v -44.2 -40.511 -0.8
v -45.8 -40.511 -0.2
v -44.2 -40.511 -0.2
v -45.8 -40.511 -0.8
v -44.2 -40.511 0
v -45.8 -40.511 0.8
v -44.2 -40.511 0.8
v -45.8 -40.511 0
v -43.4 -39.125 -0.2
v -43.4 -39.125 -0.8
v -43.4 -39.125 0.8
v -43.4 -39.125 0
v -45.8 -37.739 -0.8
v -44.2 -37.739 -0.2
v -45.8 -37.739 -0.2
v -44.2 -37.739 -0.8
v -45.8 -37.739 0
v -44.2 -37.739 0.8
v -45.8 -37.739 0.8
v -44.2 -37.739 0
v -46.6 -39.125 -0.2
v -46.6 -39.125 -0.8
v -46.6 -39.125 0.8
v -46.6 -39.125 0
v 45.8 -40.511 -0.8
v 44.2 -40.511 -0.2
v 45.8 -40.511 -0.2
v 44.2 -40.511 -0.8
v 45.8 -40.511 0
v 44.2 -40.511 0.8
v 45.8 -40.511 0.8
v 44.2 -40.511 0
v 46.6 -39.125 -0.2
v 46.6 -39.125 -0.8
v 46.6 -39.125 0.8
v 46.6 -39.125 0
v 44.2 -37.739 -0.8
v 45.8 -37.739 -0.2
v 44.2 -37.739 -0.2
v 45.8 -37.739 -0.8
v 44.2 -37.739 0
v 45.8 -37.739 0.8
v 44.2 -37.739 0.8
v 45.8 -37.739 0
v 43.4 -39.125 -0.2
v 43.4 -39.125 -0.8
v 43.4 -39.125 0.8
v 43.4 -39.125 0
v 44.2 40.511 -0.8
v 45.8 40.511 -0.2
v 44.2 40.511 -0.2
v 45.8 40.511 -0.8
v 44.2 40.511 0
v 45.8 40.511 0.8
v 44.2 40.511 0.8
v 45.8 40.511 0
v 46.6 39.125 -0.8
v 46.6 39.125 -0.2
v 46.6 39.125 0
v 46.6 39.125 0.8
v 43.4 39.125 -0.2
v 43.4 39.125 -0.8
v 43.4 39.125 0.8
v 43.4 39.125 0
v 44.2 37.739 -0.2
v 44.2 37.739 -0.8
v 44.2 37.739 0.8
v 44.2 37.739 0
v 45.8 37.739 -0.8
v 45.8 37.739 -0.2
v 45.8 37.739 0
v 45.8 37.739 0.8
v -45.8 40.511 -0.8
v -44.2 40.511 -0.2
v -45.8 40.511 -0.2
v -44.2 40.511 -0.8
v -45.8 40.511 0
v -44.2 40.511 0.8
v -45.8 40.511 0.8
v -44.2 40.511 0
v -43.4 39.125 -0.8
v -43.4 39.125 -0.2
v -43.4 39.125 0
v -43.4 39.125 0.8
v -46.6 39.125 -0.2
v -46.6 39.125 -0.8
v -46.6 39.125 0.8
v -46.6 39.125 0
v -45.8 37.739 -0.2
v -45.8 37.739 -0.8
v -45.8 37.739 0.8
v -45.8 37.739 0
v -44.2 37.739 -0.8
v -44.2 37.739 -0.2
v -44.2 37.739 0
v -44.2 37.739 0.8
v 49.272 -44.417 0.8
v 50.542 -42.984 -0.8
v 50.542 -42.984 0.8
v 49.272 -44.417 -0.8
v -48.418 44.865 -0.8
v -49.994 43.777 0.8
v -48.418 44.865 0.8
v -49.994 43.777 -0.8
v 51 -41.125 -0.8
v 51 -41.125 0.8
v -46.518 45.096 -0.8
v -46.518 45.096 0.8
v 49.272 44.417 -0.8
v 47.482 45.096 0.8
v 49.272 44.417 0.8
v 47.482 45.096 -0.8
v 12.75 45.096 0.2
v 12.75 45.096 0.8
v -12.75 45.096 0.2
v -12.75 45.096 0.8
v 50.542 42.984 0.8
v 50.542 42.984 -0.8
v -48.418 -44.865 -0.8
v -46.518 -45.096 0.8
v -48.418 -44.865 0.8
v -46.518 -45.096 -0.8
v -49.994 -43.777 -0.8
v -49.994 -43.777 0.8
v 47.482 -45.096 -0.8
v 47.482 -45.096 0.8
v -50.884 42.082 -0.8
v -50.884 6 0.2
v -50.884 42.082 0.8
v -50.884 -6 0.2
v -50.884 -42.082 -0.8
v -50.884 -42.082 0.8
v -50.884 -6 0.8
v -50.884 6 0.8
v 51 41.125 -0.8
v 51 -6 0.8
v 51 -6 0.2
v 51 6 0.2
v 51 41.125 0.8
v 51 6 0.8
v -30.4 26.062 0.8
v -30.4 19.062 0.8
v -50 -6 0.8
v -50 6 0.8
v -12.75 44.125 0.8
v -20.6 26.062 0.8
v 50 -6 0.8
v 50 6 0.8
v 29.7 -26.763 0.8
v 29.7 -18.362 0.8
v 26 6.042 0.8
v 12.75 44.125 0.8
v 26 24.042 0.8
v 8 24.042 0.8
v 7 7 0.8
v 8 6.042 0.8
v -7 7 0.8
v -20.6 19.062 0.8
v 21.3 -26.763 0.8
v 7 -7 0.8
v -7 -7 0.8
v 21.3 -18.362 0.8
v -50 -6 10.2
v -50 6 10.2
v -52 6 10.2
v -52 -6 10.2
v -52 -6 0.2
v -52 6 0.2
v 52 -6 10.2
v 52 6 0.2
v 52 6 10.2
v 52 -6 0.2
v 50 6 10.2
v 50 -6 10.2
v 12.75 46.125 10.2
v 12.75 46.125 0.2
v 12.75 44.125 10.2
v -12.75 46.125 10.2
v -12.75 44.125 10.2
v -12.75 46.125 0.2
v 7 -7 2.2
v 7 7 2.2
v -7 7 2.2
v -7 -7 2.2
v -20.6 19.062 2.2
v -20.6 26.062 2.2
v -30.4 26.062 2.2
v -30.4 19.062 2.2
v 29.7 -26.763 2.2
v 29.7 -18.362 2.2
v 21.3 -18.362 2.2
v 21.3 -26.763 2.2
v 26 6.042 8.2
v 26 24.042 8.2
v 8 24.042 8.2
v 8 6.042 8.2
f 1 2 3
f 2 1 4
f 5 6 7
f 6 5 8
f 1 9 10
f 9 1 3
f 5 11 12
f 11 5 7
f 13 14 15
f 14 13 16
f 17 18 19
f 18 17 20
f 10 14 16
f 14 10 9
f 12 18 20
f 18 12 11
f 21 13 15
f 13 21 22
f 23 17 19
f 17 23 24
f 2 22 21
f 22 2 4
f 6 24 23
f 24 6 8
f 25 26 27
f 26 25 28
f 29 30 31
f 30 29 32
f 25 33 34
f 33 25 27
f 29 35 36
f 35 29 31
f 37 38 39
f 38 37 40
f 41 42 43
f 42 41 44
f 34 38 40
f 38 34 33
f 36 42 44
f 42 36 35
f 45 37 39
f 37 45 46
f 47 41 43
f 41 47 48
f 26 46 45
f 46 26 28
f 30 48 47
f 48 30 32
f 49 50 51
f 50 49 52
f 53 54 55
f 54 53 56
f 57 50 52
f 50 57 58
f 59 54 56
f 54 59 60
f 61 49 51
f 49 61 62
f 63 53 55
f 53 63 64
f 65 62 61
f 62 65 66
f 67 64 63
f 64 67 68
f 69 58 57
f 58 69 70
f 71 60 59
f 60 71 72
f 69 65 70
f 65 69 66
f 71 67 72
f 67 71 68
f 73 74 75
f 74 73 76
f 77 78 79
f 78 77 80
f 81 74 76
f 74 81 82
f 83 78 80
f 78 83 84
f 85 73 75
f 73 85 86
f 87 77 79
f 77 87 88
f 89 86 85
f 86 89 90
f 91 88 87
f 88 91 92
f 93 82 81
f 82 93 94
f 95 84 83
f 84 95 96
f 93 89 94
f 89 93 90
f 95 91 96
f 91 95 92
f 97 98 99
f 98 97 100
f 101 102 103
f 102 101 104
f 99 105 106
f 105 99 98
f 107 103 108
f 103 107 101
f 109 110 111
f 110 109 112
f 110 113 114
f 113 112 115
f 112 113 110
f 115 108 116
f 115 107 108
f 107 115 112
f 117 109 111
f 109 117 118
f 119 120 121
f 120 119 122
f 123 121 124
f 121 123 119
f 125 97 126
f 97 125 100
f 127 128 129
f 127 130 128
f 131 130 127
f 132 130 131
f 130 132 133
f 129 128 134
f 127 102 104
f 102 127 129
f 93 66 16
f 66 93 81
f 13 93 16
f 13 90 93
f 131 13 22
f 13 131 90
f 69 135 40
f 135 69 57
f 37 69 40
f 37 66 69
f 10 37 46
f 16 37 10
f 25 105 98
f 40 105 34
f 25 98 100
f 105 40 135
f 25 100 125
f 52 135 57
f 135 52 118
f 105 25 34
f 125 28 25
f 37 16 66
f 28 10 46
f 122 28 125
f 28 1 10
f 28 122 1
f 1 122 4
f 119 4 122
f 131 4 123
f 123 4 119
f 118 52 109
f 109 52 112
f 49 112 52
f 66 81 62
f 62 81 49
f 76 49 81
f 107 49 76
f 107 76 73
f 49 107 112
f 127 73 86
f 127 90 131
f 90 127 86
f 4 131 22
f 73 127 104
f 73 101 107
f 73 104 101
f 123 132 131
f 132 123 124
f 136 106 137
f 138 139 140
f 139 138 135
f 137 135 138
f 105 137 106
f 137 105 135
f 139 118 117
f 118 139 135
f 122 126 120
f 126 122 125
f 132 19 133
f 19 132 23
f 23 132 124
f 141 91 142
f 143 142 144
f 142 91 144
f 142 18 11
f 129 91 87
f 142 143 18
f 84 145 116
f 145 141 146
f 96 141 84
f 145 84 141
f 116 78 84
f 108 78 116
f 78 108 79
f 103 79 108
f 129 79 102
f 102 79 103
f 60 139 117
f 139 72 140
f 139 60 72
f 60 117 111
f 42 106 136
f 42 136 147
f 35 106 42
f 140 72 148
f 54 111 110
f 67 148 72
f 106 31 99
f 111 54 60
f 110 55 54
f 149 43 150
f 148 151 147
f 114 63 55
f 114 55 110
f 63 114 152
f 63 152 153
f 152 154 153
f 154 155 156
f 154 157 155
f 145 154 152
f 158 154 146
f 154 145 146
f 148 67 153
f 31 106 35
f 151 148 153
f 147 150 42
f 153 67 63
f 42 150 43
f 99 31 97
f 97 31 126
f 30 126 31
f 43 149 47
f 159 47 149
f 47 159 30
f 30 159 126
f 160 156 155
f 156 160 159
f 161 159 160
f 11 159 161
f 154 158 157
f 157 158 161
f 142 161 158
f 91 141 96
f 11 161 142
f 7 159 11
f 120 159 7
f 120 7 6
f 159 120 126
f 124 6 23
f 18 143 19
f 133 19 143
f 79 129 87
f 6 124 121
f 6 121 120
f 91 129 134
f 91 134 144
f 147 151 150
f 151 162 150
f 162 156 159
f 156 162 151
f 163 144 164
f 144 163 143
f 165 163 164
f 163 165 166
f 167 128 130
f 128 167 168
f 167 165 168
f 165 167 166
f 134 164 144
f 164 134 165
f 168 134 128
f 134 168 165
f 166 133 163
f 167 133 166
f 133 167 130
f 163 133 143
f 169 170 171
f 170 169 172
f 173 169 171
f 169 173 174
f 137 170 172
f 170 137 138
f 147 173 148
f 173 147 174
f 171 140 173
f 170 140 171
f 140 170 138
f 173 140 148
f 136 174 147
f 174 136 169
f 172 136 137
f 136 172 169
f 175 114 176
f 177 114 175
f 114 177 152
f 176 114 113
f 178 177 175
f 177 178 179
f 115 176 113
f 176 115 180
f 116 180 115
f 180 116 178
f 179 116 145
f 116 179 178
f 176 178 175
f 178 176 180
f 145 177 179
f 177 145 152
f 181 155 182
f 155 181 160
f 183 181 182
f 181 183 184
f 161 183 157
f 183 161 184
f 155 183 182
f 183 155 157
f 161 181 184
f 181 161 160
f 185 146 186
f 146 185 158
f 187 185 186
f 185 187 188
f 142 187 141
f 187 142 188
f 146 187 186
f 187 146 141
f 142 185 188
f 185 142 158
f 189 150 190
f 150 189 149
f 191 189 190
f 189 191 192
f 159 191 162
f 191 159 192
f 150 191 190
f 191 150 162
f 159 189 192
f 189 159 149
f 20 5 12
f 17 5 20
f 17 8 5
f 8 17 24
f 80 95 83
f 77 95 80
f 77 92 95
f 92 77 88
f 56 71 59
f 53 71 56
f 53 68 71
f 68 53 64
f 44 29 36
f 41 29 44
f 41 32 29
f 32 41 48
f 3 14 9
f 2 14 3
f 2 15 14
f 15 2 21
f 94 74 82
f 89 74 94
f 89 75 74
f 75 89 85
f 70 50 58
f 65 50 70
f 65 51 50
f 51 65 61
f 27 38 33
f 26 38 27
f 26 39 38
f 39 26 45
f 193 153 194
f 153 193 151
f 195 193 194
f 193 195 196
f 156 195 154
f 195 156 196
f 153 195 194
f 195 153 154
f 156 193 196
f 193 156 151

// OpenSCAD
// Parameters
pcb_length = 102.0; //[51.0:204.0:0.5]
pcb_width = 90.25; //[45.0:180.5:0.25]
pcb_thickness = 1.6; //[0.8:3.2:0.1]
corner_radius = 4.0; //[2.0:8.0:0.5]
mount_hole_diameter = 3.2; //[2.0:5.0:0.1]
mount_hole_edge_offset_x = 6.0; //[3.0:12.0:0.5]
mount_hole_edge_offset_y = 6.0; //[3.0:12.0:0.5]
hole_cut_extra_z = 2.0; //[1.0:5.0:0.5]
overlap = 1.0; //[0.5:2.0:0.1]
silkscreen_thickness = 0.2; //[0.1:0.6:0.05]
silkscreen_margin = 3.0; //[1.0:8.0:0.5]
connector_height = 10.0; //[5.0:20.0:0.5]
connector_depth = 12.0; //[6.0:25.0:0.5]
connector_wall = 2.0; //[1.0:4.0:0.5]
chip_height = 2.0; //[1.0:6.0:0.25]
chip_size_x = 14.0; //[7.0:28.0:0.5]
chip_size_y = 14.0; //[7.0:28.0:0.5]
heatsink_height = 8.0; //[4.0:20.0:0.5]
heatsink_size_x = 18.0; //[10.0:36.0:0.5]
heatsink_size_y = 18.0; //[10.0:36.0:0.5]
component_overlap_into_pcb = 0.6; //[0.3:1.2:0.1]

// Base Shapes
module corner_cylinder(x, y) {
  translate([x, y, 0])
    cylinder(r=corner_radius, h=pcb_thickness, center=true);
}

module mount_hole(x, y) {
  translate([x, y, 0])
    cylinder(r=mount_hole_diameter/2, h=pcb_thickness + hole_cut_extra_z, center=true);
}

module silkscreen_border() {
  translate([0, 0, pcb_thickness/2 + silkscreen_thickness/2 - overlap])
    cube([pcb_length - 2*silkscreen_margin, pcb_width - 2*silkscreen_margin, silkscreen_thickness], center=true);
}

module connector(x, y, z) {
  translate([x, y, z])
    cube([connector_wall, connector_depth, connector_height], center=true);
}

module chip(x, y, z, sx, sy) {
  translate([x, y, z])
    cube([sx, sy, chip_height], center=true);
}

module heatsink(x, y, z) {
  translate([x, y, z])
    cube([heatsink_size_x, heatsink_size_y, heatsink_height], center=true);
}

// Operations
module pcb_main_body() {
  difference() {
    hull() {
      corner_cylinder(pcb_length/2 - corner_radius, pcb_width/2 - corner_radius);
      corner_cylinder(-pcb_length/2 + corner_radius, pcb_width/2 - corner_radius);
      corner_cylinder(-pcb_length/2 + corner_radius, -pcb_width/2 + corner_radius);
      corner_cylinder(pcb_length/2 - corner_radius, -pcb_width/2 + corner_radius);
    }
    union() {
      mount_hole(-pcb_length/2 + mount_hole_edge_offset_x, -pcb_width/2 + mount_hole_edge_offset_y);
      mount_hole(pcb_length/2 - mount_hole_edge_offset_x, -pcb_width/2 + mount_hole_edge_offset_y);
      mount_hole(pcb_length/2 - mount_hole_edge_offset_x, pcb_width/2 - mount_hole_edge_offset_y);
      mount_hole(-pcb_length/2 + mount_hole_edge_offset_x, pcb_width/2 - mount_hole_edge_offset_y);
    }
  }
}

module complete_mainboard() {
  union() {
    pcb_main_body();
    silkscreen_border();
    union() {
      connector(-pcb_length/2 - connector_wall/2 + overlap, 0, pcb_thickness/2 + connector_height/2 - component_overlap_into_pcb);
      connector(pcb_length/2 + connector_wall/2 - overlap, 0, pcb_thickness/2 + connector_height/2 - component_overlap_into_pcb);
      translate([0, pcb_width/2 + connector_wall/2 - overlap, pcb_thickness/2 + connector_height/2 - component_overlap_into_pcb])
        cube([pcb_length/4, connector_wall, connector_height], center=true);
    }
    union() {
      chip(0, 0, pcb_thickness/2 + chip_height/2 - component_overlap_into_pcb, chip_size_x, chip_size_y);
      chip(-pcb_length/4, pcb_width/4, pcb_thickness/2 + chip_height/2 - component_overlap_into_pcb, chip_size_x*0.7, chip_size_y*0.5);
      chip(pcb_length/4, -pcb_width/4, pcb_thickness/2 + chip_height/2 - component_overlap_into_pcb, chip_size_x*0.6, chip_size_y*0.6);
    }
    heatsink(pcb_length/6, pcb_width/6, pcb_thickness/2 + heatsink_height/2 - component_overlap_into_pcb);
  }
}

// Final Output
color([0.0, 0.4, 0.2]) complete_mainboard();
